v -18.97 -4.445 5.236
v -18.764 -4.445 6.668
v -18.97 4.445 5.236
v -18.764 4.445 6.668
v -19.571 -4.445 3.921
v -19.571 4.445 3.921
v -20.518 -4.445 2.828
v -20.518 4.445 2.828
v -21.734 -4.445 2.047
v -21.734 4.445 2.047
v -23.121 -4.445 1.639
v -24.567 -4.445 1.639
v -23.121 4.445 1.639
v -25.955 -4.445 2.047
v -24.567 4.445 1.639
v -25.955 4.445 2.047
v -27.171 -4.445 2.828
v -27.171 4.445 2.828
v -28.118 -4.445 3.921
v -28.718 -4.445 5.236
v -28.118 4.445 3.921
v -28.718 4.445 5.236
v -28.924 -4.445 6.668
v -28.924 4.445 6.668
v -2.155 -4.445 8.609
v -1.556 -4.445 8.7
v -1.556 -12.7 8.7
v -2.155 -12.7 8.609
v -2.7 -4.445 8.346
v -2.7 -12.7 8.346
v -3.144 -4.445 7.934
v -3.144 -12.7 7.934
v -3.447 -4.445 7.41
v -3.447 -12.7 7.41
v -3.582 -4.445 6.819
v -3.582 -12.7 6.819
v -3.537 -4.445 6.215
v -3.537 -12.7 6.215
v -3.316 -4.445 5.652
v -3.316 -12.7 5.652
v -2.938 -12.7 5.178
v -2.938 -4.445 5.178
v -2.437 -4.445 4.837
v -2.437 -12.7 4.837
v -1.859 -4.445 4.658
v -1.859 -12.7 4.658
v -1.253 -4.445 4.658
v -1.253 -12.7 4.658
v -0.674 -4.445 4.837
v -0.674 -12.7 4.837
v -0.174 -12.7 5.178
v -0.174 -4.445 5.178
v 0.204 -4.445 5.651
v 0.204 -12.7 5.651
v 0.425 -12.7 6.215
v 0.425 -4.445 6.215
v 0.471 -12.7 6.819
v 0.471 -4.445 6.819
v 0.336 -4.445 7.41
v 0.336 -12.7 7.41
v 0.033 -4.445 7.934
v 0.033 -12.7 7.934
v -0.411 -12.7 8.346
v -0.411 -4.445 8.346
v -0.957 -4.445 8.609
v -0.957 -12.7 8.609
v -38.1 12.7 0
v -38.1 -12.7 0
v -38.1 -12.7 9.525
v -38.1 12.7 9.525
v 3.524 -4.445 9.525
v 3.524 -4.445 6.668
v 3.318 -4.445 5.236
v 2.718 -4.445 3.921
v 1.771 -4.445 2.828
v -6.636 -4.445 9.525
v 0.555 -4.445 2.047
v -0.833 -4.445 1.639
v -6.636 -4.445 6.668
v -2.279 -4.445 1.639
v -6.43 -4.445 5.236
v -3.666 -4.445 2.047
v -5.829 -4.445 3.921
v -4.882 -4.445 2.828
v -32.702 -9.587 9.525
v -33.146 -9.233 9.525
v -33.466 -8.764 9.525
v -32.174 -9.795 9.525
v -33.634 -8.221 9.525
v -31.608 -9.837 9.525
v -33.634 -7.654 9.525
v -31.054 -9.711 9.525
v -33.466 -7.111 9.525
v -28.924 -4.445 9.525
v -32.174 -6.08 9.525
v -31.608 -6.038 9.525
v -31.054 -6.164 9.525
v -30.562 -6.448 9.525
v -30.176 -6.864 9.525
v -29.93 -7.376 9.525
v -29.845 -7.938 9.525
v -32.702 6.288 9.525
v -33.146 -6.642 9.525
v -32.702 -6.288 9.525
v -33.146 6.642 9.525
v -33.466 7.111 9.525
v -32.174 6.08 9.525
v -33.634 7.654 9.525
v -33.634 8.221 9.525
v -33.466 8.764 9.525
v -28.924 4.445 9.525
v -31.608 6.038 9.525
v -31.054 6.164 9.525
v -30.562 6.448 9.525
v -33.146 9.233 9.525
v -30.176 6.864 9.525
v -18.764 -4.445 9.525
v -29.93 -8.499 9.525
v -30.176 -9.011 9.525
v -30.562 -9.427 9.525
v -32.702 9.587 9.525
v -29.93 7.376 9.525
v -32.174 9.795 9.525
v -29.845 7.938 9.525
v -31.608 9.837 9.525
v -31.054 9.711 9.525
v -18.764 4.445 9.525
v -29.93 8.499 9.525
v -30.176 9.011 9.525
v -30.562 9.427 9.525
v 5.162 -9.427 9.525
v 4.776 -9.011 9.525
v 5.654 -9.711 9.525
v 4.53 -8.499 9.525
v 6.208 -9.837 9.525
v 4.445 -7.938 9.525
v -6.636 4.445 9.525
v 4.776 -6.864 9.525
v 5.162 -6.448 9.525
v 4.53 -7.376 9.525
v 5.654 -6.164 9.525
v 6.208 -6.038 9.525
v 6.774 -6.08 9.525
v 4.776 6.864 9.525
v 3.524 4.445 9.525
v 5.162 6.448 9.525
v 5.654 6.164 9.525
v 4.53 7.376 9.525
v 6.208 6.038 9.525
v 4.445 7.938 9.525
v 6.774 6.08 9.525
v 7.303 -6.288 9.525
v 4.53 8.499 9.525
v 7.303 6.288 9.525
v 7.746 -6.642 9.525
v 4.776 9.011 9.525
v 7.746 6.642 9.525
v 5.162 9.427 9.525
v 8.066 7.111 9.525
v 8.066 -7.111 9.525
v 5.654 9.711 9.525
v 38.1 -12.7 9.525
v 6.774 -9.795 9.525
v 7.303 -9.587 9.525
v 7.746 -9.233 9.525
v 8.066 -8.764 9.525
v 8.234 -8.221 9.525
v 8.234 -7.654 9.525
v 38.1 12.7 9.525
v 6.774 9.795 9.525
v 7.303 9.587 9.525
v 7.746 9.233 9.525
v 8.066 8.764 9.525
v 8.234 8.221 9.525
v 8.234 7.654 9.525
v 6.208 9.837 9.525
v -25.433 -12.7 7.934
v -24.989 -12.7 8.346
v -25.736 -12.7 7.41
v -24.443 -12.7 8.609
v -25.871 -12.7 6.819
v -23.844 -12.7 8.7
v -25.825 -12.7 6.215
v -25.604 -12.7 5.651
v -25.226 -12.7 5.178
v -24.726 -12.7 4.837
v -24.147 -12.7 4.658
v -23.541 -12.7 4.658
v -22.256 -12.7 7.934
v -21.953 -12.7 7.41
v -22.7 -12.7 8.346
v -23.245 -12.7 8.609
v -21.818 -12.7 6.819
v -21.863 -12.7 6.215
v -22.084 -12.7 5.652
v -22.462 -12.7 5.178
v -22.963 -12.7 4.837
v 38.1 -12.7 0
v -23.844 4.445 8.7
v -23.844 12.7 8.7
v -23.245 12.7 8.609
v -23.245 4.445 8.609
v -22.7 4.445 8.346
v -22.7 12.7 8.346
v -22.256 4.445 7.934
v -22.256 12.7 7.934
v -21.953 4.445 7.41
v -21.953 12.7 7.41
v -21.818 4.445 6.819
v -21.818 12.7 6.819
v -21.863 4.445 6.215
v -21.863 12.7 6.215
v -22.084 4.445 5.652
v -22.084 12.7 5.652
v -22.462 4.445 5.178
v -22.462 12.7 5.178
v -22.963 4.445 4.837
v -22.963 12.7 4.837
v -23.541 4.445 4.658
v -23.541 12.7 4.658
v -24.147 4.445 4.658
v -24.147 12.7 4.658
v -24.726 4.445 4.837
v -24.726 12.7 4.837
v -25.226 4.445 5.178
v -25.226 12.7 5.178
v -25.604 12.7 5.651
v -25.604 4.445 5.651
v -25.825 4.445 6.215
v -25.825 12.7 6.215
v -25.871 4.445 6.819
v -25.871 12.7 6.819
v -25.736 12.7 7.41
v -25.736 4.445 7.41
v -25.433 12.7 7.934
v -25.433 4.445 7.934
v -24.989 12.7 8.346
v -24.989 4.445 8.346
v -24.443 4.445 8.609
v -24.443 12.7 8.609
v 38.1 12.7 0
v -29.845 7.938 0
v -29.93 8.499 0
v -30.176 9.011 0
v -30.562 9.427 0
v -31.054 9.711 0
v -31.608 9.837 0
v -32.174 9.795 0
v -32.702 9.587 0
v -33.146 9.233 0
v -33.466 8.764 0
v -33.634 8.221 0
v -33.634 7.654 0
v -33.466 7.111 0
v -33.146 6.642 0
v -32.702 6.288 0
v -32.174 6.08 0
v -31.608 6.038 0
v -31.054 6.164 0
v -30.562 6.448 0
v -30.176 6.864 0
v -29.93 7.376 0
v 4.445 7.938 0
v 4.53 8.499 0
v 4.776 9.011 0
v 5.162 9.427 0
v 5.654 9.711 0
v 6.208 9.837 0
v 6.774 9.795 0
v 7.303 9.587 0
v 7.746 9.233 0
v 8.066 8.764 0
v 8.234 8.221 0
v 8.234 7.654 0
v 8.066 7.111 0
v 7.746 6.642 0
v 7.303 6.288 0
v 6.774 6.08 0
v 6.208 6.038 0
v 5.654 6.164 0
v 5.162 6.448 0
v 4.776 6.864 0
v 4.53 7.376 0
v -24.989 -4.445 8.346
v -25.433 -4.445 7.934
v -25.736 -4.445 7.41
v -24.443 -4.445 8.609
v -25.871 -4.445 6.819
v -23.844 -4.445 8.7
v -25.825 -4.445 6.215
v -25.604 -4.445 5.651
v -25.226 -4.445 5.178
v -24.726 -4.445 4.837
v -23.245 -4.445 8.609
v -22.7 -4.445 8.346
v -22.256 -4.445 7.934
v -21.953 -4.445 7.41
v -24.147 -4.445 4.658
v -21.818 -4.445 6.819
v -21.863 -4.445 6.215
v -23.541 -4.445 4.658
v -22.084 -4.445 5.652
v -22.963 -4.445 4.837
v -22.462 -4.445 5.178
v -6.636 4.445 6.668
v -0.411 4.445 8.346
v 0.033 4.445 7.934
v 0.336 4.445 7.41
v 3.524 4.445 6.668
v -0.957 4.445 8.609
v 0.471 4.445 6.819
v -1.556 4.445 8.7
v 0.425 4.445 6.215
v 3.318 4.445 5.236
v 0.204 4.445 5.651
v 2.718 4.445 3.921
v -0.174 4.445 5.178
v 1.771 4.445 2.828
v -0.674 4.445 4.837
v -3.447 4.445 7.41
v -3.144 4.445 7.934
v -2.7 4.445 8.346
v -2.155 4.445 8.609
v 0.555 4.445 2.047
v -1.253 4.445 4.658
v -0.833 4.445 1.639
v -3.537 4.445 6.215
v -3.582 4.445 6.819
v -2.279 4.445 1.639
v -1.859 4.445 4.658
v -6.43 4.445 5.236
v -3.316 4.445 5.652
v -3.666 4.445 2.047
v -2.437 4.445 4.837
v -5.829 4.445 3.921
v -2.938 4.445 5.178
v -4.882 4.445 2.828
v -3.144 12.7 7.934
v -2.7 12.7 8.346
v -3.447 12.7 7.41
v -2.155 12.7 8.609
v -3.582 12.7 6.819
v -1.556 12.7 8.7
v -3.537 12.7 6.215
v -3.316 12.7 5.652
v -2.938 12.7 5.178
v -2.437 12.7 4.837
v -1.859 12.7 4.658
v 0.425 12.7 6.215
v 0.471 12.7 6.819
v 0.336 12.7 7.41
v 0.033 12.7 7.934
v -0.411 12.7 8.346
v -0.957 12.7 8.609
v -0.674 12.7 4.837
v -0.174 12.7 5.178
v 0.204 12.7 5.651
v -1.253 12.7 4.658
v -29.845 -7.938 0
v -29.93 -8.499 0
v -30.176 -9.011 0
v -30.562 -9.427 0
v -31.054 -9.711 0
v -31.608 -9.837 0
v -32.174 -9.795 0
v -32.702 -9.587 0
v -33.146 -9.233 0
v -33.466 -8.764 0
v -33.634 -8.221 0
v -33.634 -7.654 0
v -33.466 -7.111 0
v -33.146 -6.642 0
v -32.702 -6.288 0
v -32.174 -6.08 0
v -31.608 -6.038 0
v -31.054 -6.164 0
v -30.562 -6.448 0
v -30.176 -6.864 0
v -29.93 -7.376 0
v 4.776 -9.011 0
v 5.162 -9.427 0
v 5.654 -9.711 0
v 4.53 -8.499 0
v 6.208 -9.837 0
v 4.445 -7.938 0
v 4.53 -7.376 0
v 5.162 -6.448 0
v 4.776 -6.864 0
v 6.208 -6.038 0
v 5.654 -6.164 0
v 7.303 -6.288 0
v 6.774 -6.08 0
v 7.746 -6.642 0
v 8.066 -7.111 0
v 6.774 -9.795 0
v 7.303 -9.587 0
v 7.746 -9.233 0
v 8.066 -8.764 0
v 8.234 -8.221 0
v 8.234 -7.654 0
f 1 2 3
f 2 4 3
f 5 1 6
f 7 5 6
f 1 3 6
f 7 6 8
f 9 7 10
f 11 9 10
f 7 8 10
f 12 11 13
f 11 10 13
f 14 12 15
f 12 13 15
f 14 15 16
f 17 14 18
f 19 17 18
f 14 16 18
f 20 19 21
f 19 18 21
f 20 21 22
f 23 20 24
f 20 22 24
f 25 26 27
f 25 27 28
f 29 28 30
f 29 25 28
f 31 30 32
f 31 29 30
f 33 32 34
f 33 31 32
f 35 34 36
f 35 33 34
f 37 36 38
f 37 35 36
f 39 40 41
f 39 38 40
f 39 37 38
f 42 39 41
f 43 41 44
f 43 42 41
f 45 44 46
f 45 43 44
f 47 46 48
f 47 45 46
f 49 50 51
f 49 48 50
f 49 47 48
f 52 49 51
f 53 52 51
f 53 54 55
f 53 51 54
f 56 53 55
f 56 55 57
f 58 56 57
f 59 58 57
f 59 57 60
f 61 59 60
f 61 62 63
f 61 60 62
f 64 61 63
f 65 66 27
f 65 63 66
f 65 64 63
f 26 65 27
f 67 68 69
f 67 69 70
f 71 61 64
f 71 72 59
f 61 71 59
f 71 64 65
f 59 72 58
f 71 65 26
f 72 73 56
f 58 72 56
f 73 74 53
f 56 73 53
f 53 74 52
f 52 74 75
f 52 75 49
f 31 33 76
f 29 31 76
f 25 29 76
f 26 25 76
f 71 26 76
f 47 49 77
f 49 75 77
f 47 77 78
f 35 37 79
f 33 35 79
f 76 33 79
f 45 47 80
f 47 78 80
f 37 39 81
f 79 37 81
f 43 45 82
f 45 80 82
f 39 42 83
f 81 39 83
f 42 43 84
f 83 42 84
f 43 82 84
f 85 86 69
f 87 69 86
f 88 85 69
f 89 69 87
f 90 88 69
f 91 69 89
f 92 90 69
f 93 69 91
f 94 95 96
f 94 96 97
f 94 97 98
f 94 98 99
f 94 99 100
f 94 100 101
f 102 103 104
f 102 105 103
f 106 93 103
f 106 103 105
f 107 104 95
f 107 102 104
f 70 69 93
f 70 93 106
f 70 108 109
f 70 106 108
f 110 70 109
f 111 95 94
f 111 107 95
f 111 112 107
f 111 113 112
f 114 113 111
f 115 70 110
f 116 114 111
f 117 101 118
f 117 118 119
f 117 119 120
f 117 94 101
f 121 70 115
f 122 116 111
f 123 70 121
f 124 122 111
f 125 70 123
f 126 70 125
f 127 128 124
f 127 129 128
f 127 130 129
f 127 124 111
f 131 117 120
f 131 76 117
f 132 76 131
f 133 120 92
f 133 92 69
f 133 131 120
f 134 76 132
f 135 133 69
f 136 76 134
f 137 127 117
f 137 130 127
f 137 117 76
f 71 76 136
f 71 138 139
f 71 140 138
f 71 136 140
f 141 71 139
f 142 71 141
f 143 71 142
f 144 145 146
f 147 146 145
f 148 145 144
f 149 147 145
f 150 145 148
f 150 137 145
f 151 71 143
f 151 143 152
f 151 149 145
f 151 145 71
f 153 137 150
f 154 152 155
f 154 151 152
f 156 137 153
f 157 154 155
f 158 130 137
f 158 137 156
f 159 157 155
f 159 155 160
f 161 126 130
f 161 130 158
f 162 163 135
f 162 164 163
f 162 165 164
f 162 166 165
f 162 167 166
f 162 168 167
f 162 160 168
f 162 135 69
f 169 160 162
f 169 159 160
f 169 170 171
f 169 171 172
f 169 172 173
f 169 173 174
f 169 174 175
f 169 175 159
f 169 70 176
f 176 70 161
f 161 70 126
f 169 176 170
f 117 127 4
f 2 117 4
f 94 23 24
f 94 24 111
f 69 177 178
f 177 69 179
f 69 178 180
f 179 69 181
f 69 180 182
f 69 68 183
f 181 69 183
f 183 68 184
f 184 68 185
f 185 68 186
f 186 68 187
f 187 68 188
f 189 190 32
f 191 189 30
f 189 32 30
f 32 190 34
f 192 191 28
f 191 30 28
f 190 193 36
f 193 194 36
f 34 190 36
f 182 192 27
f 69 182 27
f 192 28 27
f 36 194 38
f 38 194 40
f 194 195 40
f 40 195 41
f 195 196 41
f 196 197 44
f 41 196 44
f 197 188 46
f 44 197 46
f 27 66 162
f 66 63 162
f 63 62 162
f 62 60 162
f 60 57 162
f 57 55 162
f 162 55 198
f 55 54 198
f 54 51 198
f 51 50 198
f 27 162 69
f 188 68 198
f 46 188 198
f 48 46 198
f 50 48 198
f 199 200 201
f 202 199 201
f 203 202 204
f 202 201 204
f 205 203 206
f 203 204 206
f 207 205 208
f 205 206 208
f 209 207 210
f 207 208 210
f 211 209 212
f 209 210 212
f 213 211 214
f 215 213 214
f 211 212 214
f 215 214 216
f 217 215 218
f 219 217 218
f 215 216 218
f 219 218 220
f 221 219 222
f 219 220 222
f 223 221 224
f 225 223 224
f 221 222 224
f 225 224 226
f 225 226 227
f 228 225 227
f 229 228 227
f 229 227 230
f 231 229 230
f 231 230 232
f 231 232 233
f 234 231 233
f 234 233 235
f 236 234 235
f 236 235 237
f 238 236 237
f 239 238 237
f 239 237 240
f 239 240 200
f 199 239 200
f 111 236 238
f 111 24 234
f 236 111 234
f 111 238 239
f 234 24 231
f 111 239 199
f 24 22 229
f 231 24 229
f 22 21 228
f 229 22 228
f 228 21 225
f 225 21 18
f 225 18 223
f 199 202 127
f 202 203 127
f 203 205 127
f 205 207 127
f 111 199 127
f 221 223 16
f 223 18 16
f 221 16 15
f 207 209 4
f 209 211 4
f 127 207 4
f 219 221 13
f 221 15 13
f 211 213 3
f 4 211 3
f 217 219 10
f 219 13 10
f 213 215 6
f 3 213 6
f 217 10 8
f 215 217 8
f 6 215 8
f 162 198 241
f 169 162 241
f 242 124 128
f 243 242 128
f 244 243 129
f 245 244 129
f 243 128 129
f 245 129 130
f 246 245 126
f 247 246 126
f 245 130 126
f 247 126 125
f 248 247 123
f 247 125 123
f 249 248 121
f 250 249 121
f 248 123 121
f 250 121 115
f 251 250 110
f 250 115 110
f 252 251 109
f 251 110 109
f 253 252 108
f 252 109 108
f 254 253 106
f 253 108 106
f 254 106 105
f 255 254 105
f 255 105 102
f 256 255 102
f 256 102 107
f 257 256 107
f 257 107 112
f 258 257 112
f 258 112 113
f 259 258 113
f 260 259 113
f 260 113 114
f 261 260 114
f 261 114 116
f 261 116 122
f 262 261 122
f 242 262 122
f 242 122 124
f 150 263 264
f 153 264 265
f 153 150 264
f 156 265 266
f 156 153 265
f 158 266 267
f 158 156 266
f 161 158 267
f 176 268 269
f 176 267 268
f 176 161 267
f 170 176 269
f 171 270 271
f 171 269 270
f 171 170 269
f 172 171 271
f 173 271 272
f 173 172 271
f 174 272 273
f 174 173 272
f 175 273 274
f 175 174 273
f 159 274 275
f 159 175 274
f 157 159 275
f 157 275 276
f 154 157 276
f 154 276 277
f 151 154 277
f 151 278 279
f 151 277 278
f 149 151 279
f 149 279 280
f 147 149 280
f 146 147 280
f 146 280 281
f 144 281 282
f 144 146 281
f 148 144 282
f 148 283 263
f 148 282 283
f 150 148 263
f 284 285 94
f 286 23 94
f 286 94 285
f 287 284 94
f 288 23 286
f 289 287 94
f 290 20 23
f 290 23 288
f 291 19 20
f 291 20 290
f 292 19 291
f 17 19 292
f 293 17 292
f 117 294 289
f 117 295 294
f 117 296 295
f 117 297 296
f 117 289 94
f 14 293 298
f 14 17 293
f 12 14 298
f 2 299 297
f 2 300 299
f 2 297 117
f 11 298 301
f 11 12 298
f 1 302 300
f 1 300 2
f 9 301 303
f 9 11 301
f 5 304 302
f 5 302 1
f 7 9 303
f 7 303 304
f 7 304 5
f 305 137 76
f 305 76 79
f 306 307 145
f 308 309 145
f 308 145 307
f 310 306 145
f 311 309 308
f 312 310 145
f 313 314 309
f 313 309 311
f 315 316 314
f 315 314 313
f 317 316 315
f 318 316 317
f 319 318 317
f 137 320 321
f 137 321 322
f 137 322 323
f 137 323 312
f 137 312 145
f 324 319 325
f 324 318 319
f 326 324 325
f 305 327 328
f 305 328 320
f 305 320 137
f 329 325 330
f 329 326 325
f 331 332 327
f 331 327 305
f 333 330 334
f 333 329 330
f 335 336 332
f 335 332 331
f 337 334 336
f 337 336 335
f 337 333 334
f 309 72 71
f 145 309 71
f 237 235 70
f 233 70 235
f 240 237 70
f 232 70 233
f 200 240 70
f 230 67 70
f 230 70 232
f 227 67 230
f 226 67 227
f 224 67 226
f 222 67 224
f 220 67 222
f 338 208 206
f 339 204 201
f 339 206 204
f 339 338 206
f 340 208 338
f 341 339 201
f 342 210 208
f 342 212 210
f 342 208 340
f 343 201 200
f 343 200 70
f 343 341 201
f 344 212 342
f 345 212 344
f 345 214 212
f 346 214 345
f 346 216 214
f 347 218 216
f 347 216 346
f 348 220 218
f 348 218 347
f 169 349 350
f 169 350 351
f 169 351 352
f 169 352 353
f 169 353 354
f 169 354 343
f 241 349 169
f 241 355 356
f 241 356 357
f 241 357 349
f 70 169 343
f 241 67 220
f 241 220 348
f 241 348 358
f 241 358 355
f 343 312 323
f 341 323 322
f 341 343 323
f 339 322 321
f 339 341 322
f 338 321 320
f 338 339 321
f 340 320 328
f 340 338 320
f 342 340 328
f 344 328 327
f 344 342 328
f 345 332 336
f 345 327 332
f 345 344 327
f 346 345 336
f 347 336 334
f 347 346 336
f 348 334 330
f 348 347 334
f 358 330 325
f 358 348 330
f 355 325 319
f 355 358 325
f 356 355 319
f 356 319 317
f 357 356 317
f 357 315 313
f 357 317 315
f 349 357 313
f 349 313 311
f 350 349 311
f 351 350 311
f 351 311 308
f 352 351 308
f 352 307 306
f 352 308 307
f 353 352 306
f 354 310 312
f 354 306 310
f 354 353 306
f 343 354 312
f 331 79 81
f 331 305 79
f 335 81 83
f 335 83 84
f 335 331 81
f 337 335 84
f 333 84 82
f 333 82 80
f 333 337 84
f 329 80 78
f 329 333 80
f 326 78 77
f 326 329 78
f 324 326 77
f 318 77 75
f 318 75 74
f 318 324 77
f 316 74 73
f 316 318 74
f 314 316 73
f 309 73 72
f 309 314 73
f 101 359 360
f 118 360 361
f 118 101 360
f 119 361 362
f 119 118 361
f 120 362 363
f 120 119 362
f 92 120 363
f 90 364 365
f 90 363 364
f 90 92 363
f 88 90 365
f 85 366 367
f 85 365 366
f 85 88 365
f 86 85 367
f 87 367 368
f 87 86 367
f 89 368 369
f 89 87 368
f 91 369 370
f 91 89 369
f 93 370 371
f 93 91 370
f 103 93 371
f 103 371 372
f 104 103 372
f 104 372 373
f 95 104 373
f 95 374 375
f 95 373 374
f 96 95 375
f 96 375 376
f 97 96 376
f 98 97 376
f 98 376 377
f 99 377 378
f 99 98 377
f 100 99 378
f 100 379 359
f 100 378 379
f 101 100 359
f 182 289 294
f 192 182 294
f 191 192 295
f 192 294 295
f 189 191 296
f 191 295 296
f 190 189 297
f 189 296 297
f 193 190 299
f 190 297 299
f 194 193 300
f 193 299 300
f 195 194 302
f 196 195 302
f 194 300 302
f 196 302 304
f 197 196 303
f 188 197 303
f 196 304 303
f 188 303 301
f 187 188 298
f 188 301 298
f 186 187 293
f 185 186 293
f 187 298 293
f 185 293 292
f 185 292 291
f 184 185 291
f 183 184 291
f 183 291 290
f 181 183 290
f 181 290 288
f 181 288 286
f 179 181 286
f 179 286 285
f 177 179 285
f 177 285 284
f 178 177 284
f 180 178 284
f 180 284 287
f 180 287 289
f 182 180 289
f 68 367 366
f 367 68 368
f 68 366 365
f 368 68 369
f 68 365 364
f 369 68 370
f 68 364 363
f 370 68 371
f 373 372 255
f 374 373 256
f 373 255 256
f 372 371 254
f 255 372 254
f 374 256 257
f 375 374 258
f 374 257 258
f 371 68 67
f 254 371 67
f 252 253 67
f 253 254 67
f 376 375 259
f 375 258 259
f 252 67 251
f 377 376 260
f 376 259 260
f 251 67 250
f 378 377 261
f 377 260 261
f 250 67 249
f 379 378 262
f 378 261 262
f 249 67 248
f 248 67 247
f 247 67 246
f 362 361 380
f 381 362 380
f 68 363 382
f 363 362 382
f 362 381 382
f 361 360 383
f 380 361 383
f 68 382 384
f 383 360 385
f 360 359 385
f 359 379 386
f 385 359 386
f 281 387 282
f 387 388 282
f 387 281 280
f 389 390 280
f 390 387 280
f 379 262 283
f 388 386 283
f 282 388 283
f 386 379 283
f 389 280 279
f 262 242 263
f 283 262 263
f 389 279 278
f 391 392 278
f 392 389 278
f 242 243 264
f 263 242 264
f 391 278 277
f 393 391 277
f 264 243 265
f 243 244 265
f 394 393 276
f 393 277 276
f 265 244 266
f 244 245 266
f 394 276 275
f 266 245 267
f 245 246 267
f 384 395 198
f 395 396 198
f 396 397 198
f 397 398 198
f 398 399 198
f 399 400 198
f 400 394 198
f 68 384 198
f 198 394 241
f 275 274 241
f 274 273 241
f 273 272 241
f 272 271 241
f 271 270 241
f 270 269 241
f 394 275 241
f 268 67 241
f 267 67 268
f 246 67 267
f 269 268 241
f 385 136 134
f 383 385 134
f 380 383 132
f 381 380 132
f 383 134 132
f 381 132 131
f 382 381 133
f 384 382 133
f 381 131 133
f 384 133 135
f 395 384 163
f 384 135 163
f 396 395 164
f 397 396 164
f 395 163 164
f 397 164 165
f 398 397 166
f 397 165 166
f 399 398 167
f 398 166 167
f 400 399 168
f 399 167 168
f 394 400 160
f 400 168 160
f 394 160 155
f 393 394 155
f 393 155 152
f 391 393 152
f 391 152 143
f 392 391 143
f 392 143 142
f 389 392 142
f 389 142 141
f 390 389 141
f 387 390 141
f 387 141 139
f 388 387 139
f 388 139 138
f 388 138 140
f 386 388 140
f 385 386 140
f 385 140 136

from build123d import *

# Parameters (mm, degrees)
SKETCH1_W               = 76.2
SKETCH1_H               = 25.4
BOSS_EXTRUDE1_DEPTH     = 9.525
CUT_EXTRUDE2_DEPTH      = 4.445
SKETCH2_R               = 1.905
CUT_EXTRUDE1_DEPTH      = 42.275
SKETCH5_R               = 2.032
CUT_EXTRUDE3_DEPTH      = 28.575
MIRROR2_COPY_1_SKETCH_R = 1.905
MIRROR2_COPY_1_DEPTH    = 42.275


with BuildPart() as part:
    # Sketch1 → Boss-Extrude1 (new body)
    with BuildSketch(Plane.XY):
        Rectangle(SKETCH1_W, SKETCH1_H)
    extrude(amount=BOSS_EXTRUDE1_DEPTH)

    # Sketch4 → Cut-Extrude2 (cut, symmetric)
    with BuildSketch(Plane(origin=(0, 0, 0), x_dir=(1, 0, 0), z_dir=(0, 1, 0))):
        with BuildLine():
            Line((-28.92425, -6.6675), (-28.92425, -9.525))
            Line((-28.92425, -9.525), (-18.76425, -9.525))
            Line((-18.76425, -9.525), (-18.76425, -6.6675))
            ThreePointArc((-18.76425, -6.6675), (-23.84425, -1.5875), (-28.92425, -6.6675))
        make_face()
    cut_extrude2 = extrude(amount=CUT_EXTRUDE2_DEPTH, both=True, mode=Mode.SUBTRACT)

    # Sketch2 → Cut-Extrude1 (cut, through all)
    with BuildSketch(Plane.XY.offset(9.525)):
        with Locations((-31.75, 7.9375)):
            Circle(SKETCH2_R)
    cut_extrude1 = extrude(amount=-CUT_EXTRUDE1_DEPTH, mode=Mode.SUBTRACT)

    # Sketch5 → Cut-Extrude3 (cut)
    with BuildSketch(Plane(origin=(0, 12.7, 0), x_dir=(1, 0, 0), z_dir=(0, 1, 0))):
        with Locations(Location((-23.84425, -6.6675, 0), (0, 0, 270))):
            Circle(SKETCH5_R)
    cut_extrude3 = extrude(amount=-CUT_EXTRUDE3_DEPTH, mode=Mode.SUBTRACT)

    # Mirror1: Cut-Extrude1 across plane
    add(cut_extrude1.mirror(Plane.ZX), mode=Mode.SUBTRACT)

    # Mirror2: Cut-Extrude2, Cut-Extrude1, Cut-Extrude3 across plane
    add(cut_extrude2.mirror(Plane.ZY.offset(12.7)), mode=Mode.SUBTRACT)
    add(cut_extrude1.mirror(Plane.ZY.offset(12.7)), mode=Mode.SUBTRACT)
    add(cut_extrude3.mirror(Plane.ZY.offset(12.7)), mode=Mode.SUBTRACT)

    # Mirror2 copy 1 sketch → Mirror2 copy 1 (cut, through all)
    with BuildSketch(Plane(origin=(-25.4, 0, 9.525), x_dir=(-1, 0, 0), z_dir=(0, 0, 1))):
        with Locations((-31.75, 7.9375)):
            Circle(MIRROR2_COPY_1_SKETCH_R)
    extrude(amount=-MIRROR2_COPY_1_DEPTH, mode=Mode.SUBTRACT)


solid = part.part
